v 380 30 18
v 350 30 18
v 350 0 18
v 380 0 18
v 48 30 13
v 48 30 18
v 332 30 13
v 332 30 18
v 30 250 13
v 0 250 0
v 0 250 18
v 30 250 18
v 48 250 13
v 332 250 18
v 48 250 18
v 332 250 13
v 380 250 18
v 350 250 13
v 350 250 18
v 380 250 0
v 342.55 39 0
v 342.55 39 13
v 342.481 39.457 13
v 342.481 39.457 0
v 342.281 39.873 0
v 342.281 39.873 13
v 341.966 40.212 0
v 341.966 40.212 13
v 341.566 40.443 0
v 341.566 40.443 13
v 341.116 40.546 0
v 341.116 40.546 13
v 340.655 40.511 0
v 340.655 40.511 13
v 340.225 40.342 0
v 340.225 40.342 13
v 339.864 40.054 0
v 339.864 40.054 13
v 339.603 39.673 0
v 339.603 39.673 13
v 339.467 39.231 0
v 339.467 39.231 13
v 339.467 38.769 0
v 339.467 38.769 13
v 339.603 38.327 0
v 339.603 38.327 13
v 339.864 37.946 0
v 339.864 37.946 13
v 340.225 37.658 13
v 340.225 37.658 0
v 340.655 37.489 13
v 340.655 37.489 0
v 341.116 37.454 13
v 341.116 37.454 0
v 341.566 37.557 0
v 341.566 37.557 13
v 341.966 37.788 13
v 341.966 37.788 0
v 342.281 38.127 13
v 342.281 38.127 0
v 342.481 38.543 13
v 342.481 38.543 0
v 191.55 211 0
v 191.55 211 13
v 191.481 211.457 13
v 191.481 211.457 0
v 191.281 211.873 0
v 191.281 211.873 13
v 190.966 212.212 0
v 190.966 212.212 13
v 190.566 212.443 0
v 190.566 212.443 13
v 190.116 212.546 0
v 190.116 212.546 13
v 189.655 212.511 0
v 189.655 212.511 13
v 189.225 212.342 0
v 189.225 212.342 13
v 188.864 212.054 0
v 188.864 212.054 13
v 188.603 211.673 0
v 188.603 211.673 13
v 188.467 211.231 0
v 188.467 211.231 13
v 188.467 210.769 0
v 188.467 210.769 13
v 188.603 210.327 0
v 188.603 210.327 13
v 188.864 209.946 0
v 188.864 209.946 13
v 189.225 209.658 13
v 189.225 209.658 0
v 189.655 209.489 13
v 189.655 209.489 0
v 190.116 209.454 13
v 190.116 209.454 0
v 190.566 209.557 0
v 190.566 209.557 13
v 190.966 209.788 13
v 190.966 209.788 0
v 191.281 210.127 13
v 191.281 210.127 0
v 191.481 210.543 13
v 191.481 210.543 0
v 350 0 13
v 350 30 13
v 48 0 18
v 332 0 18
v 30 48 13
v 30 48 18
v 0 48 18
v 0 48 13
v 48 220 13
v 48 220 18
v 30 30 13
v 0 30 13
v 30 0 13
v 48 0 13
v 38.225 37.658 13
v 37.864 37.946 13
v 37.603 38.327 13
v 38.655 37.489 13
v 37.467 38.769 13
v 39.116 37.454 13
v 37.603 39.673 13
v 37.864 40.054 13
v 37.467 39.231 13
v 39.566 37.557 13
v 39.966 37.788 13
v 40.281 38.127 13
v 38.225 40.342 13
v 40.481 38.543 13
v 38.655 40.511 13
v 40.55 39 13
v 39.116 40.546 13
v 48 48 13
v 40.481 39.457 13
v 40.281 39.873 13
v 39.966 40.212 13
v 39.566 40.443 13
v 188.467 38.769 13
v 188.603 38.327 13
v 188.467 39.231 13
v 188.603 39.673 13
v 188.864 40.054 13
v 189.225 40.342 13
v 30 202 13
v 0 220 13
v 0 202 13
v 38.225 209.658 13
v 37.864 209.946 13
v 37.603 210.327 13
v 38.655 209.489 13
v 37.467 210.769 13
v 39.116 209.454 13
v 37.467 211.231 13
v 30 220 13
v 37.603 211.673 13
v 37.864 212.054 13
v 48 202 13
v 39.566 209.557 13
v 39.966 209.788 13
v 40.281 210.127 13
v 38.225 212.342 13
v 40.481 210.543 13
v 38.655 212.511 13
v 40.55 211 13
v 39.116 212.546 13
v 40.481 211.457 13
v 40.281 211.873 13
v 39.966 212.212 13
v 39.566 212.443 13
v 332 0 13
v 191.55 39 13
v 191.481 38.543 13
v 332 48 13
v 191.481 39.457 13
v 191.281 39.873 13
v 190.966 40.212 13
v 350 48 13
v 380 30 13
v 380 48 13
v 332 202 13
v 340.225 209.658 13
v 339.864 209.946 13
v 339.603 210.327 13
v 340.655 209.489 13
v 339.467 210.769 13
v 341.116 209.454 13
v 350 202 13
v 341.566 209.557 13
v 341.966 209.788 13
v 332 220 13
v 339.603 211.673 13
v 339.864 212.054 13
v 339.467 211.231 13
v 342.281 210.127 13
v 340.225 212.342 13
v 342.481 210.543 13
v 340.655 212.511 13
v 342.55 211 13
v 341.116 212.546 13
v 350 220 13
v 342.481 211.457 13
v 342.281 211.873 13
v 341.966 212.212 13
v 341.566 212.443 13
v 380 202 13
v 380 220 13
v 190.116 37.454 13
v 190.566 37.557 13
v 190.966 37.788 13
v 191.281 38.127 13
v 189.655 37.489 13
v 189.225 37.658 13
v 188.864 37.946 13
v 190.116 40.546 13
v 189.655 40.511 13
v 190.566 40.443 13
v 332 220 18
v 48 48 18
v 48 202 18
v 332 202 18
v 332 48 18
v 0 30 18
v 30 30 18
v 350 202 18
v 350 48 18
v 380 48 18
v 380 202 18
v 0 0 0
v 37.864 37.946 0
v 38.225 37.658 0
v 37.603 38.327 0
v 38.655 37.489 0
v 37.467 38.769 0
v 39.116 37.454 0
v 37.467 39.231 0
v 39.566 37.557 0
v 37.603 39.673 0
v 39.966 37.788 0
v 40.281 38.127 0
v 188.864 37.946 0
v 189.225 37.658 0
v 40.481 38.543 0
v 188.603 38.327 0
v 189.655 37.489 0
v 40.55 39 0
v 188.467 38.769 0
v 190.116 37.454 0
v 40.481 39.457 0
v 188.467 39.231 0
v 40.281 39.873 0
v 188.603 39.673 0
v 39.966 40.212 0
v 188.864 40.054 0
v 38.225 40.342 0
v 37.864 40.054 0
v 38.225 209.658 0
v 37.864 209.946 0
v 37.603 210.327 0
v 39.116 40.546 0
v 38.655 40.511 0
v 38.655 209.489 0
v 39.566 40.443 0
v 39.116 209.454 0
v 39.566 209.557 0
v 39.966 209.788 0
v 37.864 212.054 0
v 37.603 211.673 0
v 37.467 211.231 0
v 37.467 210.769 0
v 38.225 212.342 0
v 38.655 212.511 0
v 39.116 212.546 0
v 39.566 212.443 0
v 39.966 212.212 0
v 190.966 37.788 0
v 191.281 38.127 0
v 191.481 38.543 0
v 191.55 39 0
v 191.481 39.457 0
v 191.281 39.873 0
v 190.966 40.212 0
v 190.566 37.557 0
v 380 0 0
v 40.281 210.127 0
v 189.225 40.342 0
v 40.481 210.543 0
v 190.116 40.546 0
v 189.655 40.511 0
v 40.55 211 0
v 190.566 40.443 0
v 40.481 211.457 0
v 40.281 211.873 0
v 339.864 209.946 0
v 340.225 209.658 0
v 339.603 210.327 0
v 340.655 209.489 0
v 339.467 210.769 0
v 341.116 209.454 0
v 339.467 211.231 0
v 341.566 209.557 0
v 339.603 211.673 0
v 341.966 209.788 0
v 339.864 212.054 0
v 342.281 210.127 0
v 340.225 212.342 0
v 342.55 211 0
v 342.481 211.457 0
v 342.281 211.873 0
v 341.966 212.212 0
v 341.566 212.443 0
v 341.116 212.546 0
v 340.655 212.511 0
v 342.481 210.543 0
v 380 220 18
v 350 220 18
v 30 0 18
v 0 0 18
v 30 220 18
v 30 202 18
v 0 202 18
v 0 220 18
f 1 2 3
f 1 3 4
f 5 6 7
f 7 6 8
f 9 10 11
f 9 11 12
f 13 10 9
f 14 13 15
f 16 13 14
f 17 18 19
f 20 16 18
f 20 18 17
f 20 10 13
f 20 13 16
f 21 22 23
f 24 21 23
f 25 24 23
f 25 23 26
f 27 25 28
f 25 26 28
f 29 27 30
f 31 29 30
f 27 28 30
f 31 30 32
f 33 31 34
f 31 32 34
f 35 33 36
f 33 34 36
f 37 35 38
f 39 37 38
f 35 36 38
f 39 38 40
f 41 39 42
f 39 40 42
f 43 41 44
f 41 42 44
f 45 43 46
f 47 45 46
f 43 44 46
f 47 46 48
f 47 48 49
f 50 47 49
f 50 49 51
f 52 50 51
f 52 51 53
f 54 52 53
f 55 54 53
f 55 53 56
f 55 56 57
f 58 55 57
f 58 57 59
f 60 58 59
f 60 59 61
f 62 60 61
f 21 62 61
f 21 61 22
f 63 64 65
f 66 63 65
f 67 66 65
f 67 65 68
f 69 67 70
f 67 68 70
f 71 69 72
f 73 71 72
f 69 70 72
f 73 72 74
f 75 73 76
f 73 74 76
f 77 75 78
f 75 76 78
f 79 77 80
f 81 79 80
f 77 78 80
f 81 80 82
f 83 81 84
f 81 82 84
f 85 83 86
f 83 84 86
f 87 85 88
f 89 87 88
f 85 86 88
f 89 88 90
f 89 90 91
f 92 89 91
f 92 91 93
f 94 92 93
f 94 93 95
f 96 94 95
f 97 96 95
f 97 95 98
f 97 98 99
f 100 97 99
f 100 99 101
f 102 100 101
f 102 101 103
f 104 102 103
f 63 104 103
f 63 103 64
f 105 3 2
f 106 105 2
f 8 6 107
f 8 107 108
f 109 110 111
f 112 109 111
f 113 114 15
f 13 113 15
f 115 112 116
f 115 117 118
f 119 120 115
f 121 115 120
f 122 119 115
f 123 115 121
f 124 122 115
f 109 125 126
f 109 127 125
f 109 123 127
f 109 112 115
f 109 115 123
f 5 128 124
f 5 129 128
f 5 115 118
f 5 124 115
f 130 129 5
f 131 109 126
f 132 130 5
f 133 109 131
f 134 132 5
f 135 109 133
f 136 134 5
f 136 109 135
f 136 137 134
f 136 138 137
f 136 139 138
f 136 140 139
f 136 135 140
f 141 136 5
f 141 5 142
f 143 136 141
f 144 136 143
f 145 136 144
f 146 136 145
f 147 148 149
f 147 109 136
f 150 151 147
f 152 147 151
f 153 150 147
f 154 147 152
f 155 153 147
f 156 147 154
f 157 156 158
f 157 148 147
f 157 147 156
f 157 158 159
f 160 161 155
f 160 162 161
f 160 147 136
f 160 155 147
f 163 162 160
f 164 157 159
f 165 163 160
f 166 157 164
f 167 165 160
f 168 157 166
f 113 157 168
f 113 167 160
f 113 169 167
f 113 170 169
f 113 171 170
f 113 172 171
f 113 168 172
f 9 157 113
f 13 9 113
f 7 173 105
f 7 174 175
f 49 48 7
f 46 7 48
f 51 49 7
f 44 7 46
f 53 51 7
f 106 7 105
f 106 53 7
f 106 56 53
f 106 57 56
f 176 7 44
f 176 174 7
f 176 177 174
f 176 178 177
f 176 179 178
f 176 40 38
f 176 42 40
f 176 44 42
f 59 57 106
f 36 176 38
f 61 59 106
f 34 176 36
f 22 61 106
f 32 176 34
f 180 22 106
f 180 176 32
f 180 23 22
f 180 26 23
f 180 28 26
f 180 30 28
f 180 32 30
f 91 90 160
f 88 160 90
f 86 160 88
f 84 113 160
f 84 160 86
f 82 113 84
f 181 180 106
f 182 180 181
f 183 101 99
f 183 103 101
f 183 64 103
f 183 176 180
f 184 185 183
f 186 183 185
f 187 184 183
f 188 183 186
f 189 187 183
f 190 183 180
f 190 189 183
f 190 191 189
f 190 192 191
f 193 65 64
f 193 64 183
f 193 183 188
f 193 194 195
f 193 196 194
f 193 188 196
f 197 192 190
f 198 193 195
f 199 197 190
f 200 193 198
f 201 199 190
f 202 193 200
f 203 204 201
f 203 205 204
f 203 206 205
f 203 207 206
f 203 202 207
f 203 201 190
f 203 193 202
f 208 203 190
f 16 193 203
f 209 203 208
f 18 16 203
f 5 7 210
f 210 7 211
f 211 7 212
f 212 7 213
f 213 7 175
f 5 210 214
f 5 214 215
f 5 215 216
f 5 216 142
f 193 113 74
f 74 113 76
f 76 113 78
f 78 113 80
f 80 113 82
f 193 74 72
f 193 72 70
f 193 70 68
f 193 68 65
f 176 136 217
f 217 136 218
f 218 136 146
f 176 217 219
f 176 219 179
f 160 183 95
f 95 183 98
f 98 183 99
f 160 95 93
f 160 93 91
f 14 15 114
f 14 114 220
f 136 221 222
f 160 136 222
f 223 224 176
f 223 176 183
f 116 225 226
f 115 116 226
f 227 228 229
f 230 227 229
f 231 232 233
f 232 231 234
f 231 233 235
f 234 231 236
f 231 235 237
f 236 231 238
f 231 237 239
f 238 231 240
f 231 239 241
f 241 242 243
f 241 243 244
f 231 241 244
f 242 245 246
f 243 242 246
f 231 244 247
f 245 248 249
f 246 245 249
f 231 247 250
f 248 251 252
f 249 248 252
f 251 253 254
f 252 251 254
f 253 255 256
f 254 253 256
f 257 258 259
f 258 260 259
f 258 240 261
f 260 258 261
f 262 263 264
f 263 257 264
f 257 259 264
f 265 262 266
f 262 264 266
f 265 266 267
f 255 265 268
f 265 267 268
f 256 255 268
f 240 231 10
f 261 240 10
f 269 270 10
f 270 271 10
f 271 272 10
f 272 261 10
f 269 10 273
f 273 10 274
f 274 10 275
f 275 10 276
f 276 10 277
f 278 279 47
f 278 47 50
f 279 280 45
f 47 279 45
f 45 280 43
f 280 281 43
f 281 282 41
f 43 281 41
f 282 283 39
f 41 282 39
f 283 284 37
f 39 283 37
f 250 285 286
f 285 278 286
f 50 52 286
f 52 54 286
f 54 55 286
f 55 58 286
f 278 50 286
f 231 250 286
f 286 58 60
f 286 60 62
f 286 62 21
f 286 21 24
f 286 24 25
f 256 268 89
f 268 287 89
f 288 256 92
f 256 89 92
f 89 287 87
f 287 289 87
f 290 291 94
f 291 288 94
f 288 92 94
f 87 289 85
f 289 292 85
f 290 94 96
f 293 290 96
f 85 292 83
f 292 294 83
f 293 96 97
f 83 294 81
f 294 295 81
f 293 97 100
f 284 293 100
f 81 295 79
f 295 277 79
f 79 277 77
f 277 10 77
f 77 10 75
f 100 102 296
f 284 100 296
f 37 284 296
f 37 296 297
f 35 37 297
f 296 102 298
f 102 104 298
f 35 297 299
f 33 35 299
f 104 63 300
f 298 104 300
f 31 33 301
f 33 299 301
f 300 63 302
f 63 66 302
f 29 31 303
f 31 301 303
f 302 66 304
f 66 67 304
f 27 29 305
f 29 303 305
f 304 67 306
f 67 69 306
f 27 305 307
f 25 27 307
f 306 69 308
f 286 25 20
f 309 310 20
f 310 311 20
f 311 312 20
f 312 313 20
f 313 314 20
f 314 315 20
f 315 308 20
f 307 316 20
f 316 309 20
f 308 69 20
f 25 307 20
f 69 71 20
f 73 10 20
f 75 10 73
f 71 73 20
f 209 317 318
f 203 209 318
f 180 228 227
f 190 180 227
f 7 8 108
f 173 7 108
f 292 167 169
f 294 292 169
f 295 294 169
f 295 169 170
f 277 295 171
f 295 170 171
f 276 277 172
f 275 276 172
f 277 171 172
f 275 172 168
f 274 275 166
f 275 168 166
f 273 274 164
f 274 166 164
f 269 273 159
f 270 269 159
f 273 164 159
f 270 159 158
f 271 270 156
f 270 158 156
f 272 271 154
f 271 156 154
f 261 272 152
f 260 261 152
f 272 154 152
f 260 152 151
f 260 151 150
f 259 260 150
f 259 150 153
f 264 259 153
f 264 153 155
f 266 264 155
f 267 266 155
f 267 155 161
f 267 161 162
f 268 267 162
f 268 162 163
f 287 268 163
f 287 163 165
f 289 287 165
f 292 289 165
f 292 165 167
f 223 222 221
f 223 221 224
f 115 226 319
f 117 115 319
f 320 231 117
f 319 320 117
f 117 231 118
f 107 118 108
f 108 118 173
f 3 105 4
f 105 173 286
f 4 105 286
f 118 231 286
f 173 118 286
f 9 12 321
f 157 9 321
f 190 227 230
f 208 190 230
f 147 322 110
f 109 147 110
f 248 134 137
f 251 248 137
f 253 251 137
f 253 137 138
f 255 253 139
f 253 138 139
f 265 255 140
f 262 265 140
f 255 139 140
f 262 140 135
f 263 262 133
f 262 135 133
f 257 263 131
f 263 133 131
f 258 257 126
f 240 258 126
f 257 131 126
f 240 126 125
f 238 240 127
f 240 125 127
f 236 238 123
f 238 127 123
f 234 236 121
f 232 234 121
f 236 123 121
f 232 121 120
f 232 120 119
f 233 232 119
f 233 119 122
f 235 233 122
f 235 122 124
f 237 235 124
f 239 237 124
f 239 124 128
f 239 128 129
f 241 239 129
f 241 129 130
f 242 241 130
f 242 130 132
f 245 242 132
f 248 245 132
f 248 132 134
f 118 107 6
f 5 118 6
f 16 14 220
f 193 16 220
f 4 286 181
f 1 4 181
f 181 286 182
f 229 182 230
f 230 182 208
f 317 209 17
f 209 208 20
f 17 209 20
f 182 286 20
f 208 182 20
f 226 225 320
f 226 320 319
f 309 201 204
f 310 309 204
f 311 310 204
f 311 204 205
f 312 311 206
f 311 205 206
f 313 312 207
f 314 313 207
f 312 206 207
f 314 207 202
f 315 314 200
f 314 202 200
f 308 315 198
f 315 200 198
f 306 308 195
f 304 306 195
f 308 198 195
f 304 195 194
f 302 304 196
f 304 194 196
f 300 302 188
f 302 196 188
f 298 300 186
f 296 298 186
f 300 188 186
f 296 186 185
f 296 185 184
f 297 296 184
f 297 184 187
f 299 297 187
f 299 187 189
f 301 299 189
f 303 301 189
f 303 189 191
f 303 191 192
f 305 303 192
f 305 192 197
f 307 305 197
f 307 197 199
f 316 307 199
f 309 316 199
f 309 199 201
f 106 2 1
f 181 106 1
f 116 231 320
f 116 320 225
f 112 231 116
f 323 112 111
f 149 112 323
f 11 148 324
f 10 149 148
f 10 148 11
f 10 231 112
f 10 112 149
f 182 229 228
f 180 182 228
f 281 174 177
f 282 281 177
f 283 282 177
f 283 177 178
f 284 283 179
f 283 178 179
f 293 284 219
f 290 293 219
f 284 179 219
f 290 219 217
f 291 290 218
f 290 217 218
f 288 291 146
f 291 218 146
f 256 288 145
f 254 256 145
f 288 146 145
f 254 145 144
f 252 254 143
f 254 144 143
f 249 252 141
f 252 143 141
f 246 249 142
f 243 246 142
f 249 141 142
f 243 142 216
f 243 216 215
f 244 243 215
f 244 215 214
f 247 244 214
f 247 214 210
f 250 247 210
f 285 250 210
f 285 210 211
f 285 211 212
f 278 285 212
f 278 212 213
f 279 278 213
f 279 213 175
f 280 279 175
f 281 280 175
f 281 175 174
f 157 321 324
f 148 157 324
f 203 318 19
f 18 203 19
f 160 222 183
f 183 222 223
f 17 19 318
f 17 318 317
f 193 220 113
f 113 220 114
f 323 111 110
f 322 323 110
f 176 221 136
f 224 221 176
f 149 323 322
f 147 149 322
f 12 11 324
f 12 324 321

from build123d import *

# Parameters (mm, degrees)
SKETCH_W     = 380
SKETCH_H     = 250
PAD_DEPTH    = 18
SKETCH001_W  = 284
SKETCH001_H  = 154
POCKET_DEPTH = 5
SKETCH004_R  = 1.55
HOLE_DEPTH   = 13.001


with BuildPart() as part:
    # Sketch → Pad (new body)
    with BuildSketch(Plane.XY):
        with Locations((190, 125)):
            Rectangle(SKETCH_W, SKETCH_H)
    extrude(amount=PAD_DEPTH)

    # Sketch001 (on Face6 of Pad) → Pocket (cut)
    with BuildSketch(Plane.XY.offset(18)):
        Polygon((30, 250), (30, 220), (0, 220), (0, 202), (30, 202), (30, 48), (0, 48), (0, 30), (30, 30), (30, 0), (48, 0), (48, 30), (332, 30), (332, 0), (350, 0), (350, 30), (380, 30), (380, 48), (350, 48), (350, 202), (380, 202), (380, 220), (350, 220), (350, 250), (332, 250), (332, 220), (48, 220), (48, 250), align=None)
        with Locations((190, 125)):
            Rectangle(SKETCH001_W, SKETCH001_H, mode=Mode.SUBTRACT)
    extrude(amount=-POCKET_DEPTH, mode=Mode.SUBTRACT)

    # Sketch004 (on Face6 of Pocket) → Hole (cut, through all)
    with BuildSketch(Plane.XY.offset(13)):
        with Locations((39, 39)):
            Circle(SKETCH004_R)
        with Locations((341, 39)):
            Circle(SKETCH004_R)
        with Locations((341, 211)):
            Circle(SKETCH004_R)
        with Locations((39, 211)):
            Circle(SKETCH004_R)
        with Locations((190, 211)):
            Circle(SKETCH004_R)
        with Locations((190, 39)):
            Circle(SKETCH004_R)
    extrude(amount=-HOLE_DEPTH, mode=Mode.SUBTRACT)


solid = part.part
